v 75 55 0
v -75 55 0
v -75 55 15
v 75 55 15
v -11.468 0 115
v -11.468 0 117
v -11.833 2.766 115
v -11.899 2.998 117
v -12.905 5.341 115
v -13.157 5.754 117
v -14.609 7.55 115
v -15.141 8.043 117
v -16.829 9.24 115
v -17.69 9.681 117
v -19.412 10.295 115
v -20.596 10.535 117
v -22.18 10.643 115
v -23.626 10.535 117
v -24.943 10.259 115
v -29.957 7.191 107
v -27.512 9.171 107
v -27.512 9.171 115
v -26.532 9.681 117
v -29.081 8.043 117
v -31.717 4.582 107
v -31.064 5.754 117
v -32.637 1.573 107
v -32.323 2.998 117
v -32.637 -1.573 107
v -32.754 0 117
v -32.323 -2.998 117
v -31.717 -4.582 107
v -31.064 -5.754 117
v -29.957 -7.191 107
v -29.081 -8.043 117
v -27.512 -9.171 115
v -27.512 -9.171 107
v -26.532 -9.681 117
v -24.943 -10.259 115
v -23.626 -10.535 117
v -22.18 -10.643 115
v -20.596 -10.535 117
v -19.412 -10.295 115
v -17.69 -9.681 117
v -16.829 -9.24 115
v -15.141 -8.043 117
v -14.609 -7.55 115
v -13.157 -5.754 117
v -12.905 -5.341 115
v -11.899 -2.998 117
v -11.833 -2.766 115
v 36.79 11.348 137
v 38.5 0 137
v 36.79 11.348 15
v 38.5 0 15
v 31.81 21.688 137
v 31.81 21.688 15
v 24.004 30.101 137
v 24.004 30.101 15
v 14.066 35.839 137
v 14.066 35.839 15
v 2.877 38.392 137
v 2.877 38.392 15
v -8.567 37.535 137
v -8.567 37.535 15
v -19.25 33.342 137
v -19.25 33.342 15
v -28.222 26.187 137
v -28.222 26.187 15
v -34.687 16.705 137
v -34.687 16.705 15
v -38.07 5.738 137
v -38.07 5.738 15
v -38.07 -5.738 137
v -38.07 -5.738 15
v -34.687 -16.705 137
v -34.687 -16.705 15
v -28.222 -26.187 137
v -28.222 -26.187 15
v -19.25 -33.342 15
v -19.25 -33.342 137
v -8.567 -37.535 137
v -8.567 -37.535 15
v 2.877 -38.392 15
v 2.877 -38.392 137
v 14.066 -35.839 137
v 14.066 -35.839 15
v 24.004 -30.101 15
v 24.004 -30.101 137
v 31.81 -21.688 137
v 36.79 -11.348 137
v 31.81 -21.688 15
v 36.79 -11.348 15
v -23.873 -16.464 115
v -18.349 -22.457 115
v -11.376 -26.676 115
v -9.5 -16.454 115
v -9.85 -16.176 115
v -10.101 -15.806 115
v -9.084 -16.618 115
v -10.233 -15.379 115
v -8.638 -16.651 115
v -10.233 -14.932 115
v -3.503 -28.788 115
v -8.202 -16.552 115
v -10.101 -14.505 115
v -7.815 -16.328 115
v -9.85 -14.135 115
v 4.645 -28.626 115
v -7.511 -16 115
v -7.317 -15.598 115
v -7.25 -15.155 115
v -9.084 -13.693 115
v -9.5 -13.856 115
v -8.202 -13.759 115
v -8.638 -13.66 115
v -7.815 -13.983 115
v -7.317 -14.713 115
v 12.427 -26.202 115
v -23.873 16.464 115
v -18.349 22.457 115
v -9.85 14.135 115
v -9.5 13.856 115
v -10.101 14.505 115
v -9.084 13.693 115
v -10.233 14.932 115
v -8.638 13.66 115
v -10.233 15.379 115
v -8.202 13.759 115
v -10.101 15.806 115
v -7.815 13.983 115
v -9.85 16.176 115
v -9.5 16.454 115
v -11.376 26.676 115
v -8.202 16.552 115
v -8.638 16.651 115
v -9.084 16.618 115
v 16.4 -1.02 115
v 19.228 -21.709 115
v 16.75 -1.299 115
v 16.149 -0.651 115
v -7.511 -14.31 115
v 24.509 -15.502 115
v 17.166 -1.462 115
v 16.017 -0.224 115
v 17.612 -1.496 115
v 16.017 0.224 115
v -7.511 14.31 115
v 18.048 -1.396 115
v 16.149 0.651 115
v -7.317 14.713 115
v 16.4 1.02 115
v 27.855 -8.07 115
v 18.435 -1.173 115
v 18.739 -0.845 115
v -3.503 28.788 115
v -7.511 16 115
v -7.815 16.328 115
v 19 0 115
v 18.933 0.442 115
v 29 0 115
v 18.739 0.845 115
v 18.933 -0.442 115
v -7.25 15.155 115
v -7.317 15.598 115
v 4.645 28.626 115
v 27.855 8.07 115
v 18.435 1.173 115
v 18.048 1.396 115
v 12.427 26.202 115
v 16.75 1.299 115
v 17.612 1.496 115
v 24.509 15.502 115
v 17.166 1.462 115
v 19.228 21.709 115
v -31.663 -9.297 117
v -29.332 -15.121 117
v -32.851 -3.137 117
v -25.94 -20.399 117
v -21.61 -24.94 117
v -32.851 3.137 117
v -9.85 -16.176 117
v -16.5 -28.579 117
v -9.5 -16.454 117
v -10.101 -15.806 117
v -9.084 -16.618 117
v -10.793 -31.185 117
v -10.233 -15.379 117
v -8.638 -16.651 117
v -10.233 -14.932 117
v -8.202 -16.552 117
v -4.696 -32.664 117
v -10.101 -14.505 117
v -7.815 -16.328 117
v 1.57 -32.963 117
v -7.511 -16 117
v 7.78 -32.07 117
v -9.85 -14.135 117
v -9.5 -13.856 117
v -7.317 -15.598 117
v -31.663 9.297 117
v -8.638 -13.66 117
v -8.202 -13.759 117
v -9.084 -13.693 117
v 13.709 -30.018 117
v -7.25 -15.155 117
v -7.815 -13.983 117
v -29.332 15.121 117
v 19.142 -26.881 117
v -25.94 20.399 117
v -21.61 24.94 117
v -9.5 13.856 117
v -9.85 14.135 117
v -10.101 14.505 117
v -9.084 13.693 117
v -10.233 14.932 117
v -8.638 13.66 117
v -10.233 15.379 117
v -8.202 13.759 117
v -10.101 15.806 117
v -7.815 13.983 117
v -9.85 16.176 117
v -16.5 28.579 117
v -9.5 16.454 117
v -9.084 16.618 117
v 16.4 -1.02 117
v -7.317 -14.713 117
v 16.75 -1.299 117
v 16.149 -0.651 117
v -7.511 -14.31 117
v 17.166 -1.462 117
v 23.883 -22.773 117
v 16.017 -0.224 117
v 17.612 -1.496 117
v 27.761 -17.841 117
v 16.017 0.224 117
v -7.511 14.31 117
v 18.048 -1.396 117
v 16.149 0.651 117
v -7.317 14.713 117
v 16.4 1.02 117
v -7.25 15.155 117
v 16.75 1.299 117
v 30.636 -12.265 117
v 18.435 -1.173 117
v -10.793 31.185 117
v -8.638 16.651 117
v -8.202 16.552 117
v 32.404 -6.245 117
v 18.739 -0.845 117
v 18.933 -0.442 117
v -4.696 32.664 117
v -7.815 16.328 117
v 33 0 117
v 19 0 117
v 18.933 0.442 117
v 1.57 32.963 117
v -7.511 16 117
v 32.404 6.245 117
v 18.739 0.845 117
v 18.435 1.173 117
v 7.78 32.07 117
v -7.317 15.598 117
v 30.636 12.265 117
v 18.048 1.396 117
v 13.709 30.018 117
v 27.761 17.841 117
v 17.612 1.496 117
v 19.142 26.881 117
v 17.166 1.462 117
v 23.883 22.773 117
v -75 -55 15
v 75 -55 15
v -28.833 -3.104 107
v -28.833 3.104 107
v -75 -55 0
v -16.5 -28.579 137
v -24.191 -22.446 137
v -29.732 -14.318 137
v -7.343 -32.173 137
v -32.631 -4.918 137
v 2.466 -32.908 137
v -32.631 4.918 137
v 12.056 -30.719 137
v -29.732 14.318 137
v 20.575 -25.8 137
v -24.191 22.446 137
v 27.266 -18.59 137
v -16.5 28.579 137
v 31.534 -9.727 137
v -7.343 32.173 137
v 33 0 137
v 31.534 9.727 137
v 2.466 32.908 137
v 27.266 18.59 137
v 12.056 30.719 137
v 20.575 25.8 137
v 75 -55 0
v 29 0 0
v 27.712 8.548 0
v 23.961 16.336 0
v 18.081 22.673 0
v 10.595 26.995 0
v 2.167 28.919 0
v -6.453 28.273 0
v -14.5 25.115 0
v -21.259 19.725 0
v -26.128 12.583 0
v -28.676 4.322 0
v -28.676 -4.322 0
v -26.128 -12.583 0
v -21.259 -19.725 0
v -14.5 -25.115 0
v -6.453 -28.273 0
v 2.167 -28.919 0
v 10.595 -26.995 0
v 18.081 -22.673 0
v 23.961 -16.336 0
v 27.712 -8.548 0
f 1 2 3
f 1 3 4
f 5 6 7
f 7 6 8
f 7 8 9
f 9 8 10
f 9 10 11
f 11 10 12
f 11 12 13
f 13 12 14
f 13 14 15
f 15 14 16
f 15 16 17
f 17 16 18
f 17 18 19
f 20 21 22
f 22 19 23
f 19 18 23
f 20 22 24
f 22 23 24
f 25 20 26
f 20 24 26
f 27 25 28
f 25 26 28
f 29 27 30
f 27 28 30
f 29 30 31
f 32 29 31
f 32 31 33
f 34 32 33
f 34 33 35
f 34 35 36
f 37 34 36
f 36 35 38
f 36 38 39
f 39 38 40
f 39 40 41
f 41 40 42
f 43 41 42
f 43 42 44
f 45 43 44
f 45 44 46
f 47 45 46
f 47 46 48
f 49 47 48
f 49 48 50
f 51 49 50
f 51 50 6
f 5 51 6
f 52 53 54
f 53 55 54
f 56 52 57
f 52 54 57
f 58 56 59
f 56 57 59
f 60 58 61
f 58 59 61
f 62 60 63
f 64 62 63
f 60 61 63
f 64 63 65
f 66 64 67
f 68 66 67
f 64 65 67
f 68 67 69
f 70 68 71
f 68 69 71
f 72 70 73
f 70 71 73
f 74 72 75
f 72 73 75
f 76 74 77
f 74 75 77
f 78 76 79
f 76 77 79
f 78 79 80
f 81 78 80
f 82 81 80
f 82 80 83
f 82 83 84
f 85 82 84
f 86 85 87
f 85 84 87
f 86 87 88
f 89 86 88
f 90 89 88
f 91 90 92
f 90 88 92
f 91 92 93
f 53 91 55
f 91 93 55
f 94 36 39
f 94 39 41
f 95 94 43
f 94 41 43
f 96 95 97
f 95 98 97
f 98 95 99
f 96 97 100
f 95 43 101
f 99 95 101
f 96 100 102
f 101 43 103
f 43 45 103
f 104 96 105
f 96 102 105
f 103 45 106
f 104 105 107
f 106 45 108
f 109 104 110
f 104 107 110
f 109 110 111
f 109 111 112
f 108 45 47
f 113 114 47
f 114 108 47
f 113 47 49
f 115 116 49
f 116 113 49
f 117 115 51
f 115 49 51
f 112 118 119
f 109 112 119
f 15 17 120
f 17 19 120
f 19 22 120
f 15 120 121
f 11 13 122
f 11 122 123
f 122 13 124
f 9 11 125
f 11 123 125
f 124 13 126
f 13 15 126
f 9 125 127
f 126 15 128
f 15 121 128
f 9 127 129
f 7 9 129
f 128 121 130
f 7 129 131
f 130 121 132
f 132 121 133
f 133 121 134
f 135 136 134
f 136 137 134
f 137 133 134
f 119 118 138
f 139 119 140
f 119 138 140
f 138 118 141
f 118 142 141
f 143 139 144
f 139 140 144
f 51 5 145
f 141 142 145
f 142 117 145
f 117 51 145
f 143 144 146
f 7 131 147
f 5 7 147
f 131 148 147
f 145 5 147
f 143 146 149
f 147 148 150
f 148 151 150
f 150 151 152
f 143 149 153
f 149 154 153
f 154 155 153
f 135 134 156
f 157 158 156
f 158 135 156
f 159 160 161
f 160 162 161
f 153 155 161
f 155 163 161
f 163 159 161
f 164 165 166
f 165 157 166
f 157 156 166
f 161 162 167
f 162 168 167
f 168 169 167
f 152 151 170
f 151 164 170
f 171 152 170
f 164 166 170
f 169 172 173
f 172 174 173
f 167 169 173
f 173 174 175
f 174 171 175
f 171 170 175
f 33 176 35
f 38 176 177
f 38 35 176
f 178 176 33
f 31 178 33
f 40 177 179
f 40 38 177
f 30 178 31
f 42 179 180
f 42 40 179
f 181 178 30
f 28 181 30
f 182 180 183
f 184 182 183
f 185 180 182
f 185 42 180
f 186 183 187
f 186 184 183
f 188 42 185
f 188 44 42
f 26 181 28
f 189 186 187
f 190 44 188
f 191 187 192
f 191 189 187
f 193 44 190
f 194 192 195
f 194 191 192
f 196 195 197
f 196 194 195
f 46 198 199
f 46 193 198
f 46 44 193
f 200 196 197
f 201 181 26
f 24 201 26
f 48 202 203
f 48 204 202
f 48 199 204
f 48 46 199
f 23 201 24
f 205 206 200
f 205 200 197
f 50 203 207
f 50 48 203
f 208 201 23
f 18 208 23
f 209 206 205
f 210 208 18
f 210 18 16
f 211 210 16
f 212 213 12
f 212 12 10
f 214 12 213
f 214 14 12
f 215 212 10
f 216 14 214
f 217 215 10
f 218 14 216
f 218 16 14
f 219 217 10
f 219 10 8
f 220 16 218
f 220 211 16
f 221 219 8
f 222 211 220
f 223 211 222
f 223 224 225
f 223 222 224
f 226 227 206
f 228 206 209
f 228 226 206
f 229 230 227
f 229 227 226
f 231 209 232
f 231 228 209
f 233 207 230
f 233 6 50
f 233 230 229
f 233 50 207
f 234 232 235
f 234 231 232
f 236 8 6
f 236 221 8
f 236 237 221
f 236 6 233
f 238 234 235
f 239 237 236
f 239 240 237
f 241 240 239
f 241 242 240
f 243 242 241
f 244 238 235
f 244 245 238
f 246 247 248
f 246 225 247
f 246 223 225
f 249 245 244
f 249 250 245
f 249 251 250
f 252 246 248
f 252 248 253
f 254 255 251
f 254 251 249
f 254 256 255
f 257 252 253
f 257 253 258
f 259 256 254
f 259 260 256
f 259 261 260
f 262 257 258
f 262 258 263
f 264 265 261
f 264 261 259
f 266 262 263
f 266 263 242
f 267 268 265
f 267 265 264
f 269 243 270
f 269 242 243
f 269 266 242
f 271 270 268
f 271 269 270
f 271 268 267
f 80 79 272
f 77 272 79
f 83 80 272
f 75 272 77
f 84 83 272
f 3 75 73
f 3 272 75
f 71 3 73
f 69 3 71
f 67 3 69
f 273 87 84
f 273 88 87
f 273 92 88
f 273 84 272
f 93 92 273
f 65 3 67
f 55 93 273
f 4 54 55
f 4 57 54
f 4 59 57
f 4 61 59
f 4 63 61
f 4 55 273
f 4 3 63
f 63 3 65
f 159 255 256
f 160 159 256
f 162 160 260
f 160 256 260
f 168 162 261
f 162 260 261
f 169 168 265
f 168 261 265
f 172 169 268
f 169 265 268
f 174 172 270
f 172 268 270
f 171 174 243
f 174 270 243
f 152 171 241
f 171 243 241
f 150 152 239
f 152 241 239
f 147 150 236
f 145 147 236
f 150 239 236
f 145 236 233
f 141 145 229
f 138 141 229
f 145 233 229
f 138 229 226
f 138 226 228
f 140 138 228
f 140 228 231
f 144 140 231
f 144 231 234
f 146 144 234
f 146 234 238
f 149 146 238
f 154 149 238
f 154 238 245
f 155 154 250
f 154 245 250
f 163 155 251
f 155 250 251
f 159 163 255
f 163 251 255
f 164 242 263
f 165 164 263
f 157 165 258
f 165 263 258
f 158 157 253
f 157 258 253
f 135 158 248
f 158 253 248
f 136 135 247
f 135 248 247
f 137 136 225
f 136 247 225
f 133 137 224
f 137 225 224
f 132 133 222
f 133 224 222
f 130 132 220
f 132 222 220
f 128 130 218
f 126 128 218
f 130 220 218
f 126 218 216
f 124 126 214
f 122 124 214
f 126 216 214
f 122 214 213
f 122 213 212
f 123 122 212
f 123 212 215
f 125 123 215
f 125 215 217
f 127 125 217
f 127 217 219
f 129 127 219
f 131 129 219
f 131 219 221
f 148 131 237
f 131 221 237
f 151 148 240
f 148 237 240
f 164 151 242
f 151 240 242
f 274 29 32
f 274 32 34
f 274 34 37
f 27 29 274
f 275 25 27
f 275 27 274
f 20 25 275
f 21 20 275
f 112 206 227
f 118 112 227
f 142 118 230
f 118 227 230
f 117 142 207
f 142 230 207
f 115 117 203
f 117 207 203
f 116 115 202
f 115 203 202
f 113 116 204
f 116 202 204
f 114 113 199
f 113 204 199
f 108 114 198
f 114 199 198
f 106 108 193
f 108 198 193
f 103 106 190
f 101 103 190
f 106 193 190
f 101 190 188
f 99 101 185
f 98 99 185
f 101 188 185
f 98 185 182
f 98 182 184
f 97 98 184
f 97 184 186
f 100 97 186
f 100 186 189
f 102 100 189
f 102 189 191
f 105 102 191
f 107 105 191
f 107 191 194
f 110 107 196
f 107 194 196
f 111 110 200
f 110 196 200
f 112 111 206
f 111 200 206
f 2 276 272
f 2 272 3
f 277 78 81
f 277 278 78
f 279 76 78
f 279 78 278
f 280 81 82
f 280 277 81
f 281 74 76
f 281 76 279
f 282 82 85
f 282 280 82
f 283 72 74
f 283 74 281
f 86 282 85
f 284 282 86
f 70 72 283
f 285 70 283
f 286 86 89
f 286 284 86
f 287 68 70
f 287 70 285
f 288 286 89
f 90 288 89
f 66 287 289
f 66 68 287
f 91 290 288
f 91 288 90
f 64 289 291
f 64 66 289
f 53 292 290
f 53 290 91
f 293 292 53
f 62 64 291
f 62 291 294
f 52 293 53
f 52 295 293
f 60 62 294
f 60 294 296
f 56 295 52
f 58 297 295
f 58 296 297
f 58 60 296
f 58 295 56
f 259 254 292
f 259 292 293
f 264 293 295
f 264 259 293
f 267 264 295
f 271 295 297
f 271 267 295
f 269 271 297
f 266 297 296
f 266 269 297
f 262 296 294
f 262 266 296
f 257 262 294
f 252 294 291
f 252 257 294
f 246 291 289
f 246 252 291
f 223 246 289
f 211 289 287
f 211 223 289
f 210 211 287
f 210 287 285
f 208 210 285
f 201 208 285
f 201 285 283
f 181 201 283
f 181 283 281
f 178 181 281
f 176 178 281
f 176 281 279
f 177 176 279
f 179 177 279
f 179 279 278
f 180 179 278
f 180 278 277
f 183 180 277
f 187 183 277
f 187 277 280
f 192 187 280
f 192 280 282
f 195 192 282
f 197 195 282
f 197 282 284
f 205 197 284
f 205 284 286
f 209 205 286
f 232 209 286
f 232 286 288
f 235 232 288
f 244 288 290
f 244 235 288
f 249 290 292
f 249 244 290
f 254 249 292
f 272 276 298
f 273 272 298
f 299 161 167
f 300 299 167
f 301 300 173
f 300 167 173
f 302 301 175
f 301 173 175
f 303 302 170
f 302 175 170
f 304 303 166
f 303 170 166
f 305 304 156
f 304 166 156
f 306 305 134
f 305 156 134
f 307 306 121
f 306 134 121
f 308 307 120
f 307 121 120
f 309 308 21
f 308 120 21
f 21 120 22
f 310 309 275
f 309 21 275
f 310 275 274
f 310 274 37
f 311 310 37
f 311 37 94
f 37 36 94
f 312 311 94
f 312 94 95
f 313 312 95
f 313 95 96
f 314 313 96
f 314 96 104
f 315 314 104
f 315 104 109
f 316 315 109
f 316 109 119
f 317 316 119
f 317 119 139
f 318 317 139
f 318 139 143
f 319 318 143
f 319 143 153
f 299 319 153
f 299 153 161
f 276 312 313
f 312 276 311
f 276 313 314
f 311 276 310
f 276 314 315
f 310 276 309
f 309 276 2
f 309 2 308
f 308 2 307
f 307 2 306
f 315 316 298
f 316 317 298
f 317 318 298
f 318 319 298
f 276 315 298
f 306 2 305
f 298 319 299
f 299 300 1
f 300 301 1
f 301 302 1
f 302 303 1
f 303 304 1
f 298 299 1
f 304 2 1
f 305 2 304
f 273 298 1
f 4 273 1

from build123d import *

# Parameters (mm, degrees)
SKETCH_1_W          = 150
SKETCH_1_H          = 110
EXTRUDE_1_DEPTH     = 15
SKETCH_2_R          = 38.5
EXTRUDE_2_DEPTH     = 100
SKETCH_4_R          = 29
CUT_EXTRUDE_1_DEPTH = 145
SKETCH_5_R          = 33
EXTRUDE_3_DEPTH     = 2
SKETCH_6_R          = 1.5
CUT_EXTRUDE_2_DEPTH = 2
SKETCH_7_R          = 38.5
SKETCH_7_R_2        = 33
EXTRUDE_4_DEPTH     = 22
SKETCH_8_R          = 10.643046967
CUT_EXTRUDE_3_DEPTH = 10


with BuildPart() as part:
    # 草图1 → 凸台-拉伸1 (new body)
    with BuildSketch(Plane.XY):
        Rectangle(SKETCH_1_W, SKETCH_1_H)
    extrude(amount=EXTRUDE_1_DEPTH)

    # 草图2 → 凸台-拉伸2 (add)
    with BuildSketch(Plane.XY.offset(15)):
        Circle(SKETCH_2_R)
    extrude(amount=EXTRUDE_2_DEPTH)

    # 草图4 → 切除-拉伸1 (cut)
    with BuildSketch(Plane.XY.offset(115)):
        Circle(SKETCH_4_R)
    extrude(amount=-CUT_EXTRUDE_1_DEPTH, mode=Mode.SUBTRACT)

    # 草图5 → 凸台-拉伸3 (add)
    with BuildSketch(Plane.XY.offset(115)):
        Circle(SKETCH_5_R)
    extrude(amount=EXTRUDE_3_DEPTH)

    # 草图6 → 切除-拉伸2 (cut)
    with BuildSketch(Plane.XY.offset(117)):
        with Locations((17.5, 0)):
            Circle(SKETCH_6_R)
        with Locations((-8.75, -15.155444566)):
            Circle(SKETCH_6_R)
        with Locations((-8.75, 15.155444566)):
            Circle(SKETCH_6_R)
    extrude(amount=-CUT_EXTRUDE_2_DEPTH, mode=Mode.SUBTRACT)

    # 草图7 → 凸台-拉伸4 (add)
    with BuildSketch(Plane.XY.offset(115)):
        Circle(SKETCH_7_R)
        Circle(SKETCH_7_R_2, mode=Mode.SUBTRACT)
    extrude(amount=EXTRUDE_4_DEPTH)

    # 草图8 → 切除-拉伸3 (cut)
    with BuildSketch(Plane.XY.offset(117)):
        with Locations((-22.11085185, 0)):
            Circle(SKETCH_8_R)
    extrude(amount=-CUT_EXTRUDE_3_DEPTH, mode=Mode.SUBTRACT)


solid = part.part
